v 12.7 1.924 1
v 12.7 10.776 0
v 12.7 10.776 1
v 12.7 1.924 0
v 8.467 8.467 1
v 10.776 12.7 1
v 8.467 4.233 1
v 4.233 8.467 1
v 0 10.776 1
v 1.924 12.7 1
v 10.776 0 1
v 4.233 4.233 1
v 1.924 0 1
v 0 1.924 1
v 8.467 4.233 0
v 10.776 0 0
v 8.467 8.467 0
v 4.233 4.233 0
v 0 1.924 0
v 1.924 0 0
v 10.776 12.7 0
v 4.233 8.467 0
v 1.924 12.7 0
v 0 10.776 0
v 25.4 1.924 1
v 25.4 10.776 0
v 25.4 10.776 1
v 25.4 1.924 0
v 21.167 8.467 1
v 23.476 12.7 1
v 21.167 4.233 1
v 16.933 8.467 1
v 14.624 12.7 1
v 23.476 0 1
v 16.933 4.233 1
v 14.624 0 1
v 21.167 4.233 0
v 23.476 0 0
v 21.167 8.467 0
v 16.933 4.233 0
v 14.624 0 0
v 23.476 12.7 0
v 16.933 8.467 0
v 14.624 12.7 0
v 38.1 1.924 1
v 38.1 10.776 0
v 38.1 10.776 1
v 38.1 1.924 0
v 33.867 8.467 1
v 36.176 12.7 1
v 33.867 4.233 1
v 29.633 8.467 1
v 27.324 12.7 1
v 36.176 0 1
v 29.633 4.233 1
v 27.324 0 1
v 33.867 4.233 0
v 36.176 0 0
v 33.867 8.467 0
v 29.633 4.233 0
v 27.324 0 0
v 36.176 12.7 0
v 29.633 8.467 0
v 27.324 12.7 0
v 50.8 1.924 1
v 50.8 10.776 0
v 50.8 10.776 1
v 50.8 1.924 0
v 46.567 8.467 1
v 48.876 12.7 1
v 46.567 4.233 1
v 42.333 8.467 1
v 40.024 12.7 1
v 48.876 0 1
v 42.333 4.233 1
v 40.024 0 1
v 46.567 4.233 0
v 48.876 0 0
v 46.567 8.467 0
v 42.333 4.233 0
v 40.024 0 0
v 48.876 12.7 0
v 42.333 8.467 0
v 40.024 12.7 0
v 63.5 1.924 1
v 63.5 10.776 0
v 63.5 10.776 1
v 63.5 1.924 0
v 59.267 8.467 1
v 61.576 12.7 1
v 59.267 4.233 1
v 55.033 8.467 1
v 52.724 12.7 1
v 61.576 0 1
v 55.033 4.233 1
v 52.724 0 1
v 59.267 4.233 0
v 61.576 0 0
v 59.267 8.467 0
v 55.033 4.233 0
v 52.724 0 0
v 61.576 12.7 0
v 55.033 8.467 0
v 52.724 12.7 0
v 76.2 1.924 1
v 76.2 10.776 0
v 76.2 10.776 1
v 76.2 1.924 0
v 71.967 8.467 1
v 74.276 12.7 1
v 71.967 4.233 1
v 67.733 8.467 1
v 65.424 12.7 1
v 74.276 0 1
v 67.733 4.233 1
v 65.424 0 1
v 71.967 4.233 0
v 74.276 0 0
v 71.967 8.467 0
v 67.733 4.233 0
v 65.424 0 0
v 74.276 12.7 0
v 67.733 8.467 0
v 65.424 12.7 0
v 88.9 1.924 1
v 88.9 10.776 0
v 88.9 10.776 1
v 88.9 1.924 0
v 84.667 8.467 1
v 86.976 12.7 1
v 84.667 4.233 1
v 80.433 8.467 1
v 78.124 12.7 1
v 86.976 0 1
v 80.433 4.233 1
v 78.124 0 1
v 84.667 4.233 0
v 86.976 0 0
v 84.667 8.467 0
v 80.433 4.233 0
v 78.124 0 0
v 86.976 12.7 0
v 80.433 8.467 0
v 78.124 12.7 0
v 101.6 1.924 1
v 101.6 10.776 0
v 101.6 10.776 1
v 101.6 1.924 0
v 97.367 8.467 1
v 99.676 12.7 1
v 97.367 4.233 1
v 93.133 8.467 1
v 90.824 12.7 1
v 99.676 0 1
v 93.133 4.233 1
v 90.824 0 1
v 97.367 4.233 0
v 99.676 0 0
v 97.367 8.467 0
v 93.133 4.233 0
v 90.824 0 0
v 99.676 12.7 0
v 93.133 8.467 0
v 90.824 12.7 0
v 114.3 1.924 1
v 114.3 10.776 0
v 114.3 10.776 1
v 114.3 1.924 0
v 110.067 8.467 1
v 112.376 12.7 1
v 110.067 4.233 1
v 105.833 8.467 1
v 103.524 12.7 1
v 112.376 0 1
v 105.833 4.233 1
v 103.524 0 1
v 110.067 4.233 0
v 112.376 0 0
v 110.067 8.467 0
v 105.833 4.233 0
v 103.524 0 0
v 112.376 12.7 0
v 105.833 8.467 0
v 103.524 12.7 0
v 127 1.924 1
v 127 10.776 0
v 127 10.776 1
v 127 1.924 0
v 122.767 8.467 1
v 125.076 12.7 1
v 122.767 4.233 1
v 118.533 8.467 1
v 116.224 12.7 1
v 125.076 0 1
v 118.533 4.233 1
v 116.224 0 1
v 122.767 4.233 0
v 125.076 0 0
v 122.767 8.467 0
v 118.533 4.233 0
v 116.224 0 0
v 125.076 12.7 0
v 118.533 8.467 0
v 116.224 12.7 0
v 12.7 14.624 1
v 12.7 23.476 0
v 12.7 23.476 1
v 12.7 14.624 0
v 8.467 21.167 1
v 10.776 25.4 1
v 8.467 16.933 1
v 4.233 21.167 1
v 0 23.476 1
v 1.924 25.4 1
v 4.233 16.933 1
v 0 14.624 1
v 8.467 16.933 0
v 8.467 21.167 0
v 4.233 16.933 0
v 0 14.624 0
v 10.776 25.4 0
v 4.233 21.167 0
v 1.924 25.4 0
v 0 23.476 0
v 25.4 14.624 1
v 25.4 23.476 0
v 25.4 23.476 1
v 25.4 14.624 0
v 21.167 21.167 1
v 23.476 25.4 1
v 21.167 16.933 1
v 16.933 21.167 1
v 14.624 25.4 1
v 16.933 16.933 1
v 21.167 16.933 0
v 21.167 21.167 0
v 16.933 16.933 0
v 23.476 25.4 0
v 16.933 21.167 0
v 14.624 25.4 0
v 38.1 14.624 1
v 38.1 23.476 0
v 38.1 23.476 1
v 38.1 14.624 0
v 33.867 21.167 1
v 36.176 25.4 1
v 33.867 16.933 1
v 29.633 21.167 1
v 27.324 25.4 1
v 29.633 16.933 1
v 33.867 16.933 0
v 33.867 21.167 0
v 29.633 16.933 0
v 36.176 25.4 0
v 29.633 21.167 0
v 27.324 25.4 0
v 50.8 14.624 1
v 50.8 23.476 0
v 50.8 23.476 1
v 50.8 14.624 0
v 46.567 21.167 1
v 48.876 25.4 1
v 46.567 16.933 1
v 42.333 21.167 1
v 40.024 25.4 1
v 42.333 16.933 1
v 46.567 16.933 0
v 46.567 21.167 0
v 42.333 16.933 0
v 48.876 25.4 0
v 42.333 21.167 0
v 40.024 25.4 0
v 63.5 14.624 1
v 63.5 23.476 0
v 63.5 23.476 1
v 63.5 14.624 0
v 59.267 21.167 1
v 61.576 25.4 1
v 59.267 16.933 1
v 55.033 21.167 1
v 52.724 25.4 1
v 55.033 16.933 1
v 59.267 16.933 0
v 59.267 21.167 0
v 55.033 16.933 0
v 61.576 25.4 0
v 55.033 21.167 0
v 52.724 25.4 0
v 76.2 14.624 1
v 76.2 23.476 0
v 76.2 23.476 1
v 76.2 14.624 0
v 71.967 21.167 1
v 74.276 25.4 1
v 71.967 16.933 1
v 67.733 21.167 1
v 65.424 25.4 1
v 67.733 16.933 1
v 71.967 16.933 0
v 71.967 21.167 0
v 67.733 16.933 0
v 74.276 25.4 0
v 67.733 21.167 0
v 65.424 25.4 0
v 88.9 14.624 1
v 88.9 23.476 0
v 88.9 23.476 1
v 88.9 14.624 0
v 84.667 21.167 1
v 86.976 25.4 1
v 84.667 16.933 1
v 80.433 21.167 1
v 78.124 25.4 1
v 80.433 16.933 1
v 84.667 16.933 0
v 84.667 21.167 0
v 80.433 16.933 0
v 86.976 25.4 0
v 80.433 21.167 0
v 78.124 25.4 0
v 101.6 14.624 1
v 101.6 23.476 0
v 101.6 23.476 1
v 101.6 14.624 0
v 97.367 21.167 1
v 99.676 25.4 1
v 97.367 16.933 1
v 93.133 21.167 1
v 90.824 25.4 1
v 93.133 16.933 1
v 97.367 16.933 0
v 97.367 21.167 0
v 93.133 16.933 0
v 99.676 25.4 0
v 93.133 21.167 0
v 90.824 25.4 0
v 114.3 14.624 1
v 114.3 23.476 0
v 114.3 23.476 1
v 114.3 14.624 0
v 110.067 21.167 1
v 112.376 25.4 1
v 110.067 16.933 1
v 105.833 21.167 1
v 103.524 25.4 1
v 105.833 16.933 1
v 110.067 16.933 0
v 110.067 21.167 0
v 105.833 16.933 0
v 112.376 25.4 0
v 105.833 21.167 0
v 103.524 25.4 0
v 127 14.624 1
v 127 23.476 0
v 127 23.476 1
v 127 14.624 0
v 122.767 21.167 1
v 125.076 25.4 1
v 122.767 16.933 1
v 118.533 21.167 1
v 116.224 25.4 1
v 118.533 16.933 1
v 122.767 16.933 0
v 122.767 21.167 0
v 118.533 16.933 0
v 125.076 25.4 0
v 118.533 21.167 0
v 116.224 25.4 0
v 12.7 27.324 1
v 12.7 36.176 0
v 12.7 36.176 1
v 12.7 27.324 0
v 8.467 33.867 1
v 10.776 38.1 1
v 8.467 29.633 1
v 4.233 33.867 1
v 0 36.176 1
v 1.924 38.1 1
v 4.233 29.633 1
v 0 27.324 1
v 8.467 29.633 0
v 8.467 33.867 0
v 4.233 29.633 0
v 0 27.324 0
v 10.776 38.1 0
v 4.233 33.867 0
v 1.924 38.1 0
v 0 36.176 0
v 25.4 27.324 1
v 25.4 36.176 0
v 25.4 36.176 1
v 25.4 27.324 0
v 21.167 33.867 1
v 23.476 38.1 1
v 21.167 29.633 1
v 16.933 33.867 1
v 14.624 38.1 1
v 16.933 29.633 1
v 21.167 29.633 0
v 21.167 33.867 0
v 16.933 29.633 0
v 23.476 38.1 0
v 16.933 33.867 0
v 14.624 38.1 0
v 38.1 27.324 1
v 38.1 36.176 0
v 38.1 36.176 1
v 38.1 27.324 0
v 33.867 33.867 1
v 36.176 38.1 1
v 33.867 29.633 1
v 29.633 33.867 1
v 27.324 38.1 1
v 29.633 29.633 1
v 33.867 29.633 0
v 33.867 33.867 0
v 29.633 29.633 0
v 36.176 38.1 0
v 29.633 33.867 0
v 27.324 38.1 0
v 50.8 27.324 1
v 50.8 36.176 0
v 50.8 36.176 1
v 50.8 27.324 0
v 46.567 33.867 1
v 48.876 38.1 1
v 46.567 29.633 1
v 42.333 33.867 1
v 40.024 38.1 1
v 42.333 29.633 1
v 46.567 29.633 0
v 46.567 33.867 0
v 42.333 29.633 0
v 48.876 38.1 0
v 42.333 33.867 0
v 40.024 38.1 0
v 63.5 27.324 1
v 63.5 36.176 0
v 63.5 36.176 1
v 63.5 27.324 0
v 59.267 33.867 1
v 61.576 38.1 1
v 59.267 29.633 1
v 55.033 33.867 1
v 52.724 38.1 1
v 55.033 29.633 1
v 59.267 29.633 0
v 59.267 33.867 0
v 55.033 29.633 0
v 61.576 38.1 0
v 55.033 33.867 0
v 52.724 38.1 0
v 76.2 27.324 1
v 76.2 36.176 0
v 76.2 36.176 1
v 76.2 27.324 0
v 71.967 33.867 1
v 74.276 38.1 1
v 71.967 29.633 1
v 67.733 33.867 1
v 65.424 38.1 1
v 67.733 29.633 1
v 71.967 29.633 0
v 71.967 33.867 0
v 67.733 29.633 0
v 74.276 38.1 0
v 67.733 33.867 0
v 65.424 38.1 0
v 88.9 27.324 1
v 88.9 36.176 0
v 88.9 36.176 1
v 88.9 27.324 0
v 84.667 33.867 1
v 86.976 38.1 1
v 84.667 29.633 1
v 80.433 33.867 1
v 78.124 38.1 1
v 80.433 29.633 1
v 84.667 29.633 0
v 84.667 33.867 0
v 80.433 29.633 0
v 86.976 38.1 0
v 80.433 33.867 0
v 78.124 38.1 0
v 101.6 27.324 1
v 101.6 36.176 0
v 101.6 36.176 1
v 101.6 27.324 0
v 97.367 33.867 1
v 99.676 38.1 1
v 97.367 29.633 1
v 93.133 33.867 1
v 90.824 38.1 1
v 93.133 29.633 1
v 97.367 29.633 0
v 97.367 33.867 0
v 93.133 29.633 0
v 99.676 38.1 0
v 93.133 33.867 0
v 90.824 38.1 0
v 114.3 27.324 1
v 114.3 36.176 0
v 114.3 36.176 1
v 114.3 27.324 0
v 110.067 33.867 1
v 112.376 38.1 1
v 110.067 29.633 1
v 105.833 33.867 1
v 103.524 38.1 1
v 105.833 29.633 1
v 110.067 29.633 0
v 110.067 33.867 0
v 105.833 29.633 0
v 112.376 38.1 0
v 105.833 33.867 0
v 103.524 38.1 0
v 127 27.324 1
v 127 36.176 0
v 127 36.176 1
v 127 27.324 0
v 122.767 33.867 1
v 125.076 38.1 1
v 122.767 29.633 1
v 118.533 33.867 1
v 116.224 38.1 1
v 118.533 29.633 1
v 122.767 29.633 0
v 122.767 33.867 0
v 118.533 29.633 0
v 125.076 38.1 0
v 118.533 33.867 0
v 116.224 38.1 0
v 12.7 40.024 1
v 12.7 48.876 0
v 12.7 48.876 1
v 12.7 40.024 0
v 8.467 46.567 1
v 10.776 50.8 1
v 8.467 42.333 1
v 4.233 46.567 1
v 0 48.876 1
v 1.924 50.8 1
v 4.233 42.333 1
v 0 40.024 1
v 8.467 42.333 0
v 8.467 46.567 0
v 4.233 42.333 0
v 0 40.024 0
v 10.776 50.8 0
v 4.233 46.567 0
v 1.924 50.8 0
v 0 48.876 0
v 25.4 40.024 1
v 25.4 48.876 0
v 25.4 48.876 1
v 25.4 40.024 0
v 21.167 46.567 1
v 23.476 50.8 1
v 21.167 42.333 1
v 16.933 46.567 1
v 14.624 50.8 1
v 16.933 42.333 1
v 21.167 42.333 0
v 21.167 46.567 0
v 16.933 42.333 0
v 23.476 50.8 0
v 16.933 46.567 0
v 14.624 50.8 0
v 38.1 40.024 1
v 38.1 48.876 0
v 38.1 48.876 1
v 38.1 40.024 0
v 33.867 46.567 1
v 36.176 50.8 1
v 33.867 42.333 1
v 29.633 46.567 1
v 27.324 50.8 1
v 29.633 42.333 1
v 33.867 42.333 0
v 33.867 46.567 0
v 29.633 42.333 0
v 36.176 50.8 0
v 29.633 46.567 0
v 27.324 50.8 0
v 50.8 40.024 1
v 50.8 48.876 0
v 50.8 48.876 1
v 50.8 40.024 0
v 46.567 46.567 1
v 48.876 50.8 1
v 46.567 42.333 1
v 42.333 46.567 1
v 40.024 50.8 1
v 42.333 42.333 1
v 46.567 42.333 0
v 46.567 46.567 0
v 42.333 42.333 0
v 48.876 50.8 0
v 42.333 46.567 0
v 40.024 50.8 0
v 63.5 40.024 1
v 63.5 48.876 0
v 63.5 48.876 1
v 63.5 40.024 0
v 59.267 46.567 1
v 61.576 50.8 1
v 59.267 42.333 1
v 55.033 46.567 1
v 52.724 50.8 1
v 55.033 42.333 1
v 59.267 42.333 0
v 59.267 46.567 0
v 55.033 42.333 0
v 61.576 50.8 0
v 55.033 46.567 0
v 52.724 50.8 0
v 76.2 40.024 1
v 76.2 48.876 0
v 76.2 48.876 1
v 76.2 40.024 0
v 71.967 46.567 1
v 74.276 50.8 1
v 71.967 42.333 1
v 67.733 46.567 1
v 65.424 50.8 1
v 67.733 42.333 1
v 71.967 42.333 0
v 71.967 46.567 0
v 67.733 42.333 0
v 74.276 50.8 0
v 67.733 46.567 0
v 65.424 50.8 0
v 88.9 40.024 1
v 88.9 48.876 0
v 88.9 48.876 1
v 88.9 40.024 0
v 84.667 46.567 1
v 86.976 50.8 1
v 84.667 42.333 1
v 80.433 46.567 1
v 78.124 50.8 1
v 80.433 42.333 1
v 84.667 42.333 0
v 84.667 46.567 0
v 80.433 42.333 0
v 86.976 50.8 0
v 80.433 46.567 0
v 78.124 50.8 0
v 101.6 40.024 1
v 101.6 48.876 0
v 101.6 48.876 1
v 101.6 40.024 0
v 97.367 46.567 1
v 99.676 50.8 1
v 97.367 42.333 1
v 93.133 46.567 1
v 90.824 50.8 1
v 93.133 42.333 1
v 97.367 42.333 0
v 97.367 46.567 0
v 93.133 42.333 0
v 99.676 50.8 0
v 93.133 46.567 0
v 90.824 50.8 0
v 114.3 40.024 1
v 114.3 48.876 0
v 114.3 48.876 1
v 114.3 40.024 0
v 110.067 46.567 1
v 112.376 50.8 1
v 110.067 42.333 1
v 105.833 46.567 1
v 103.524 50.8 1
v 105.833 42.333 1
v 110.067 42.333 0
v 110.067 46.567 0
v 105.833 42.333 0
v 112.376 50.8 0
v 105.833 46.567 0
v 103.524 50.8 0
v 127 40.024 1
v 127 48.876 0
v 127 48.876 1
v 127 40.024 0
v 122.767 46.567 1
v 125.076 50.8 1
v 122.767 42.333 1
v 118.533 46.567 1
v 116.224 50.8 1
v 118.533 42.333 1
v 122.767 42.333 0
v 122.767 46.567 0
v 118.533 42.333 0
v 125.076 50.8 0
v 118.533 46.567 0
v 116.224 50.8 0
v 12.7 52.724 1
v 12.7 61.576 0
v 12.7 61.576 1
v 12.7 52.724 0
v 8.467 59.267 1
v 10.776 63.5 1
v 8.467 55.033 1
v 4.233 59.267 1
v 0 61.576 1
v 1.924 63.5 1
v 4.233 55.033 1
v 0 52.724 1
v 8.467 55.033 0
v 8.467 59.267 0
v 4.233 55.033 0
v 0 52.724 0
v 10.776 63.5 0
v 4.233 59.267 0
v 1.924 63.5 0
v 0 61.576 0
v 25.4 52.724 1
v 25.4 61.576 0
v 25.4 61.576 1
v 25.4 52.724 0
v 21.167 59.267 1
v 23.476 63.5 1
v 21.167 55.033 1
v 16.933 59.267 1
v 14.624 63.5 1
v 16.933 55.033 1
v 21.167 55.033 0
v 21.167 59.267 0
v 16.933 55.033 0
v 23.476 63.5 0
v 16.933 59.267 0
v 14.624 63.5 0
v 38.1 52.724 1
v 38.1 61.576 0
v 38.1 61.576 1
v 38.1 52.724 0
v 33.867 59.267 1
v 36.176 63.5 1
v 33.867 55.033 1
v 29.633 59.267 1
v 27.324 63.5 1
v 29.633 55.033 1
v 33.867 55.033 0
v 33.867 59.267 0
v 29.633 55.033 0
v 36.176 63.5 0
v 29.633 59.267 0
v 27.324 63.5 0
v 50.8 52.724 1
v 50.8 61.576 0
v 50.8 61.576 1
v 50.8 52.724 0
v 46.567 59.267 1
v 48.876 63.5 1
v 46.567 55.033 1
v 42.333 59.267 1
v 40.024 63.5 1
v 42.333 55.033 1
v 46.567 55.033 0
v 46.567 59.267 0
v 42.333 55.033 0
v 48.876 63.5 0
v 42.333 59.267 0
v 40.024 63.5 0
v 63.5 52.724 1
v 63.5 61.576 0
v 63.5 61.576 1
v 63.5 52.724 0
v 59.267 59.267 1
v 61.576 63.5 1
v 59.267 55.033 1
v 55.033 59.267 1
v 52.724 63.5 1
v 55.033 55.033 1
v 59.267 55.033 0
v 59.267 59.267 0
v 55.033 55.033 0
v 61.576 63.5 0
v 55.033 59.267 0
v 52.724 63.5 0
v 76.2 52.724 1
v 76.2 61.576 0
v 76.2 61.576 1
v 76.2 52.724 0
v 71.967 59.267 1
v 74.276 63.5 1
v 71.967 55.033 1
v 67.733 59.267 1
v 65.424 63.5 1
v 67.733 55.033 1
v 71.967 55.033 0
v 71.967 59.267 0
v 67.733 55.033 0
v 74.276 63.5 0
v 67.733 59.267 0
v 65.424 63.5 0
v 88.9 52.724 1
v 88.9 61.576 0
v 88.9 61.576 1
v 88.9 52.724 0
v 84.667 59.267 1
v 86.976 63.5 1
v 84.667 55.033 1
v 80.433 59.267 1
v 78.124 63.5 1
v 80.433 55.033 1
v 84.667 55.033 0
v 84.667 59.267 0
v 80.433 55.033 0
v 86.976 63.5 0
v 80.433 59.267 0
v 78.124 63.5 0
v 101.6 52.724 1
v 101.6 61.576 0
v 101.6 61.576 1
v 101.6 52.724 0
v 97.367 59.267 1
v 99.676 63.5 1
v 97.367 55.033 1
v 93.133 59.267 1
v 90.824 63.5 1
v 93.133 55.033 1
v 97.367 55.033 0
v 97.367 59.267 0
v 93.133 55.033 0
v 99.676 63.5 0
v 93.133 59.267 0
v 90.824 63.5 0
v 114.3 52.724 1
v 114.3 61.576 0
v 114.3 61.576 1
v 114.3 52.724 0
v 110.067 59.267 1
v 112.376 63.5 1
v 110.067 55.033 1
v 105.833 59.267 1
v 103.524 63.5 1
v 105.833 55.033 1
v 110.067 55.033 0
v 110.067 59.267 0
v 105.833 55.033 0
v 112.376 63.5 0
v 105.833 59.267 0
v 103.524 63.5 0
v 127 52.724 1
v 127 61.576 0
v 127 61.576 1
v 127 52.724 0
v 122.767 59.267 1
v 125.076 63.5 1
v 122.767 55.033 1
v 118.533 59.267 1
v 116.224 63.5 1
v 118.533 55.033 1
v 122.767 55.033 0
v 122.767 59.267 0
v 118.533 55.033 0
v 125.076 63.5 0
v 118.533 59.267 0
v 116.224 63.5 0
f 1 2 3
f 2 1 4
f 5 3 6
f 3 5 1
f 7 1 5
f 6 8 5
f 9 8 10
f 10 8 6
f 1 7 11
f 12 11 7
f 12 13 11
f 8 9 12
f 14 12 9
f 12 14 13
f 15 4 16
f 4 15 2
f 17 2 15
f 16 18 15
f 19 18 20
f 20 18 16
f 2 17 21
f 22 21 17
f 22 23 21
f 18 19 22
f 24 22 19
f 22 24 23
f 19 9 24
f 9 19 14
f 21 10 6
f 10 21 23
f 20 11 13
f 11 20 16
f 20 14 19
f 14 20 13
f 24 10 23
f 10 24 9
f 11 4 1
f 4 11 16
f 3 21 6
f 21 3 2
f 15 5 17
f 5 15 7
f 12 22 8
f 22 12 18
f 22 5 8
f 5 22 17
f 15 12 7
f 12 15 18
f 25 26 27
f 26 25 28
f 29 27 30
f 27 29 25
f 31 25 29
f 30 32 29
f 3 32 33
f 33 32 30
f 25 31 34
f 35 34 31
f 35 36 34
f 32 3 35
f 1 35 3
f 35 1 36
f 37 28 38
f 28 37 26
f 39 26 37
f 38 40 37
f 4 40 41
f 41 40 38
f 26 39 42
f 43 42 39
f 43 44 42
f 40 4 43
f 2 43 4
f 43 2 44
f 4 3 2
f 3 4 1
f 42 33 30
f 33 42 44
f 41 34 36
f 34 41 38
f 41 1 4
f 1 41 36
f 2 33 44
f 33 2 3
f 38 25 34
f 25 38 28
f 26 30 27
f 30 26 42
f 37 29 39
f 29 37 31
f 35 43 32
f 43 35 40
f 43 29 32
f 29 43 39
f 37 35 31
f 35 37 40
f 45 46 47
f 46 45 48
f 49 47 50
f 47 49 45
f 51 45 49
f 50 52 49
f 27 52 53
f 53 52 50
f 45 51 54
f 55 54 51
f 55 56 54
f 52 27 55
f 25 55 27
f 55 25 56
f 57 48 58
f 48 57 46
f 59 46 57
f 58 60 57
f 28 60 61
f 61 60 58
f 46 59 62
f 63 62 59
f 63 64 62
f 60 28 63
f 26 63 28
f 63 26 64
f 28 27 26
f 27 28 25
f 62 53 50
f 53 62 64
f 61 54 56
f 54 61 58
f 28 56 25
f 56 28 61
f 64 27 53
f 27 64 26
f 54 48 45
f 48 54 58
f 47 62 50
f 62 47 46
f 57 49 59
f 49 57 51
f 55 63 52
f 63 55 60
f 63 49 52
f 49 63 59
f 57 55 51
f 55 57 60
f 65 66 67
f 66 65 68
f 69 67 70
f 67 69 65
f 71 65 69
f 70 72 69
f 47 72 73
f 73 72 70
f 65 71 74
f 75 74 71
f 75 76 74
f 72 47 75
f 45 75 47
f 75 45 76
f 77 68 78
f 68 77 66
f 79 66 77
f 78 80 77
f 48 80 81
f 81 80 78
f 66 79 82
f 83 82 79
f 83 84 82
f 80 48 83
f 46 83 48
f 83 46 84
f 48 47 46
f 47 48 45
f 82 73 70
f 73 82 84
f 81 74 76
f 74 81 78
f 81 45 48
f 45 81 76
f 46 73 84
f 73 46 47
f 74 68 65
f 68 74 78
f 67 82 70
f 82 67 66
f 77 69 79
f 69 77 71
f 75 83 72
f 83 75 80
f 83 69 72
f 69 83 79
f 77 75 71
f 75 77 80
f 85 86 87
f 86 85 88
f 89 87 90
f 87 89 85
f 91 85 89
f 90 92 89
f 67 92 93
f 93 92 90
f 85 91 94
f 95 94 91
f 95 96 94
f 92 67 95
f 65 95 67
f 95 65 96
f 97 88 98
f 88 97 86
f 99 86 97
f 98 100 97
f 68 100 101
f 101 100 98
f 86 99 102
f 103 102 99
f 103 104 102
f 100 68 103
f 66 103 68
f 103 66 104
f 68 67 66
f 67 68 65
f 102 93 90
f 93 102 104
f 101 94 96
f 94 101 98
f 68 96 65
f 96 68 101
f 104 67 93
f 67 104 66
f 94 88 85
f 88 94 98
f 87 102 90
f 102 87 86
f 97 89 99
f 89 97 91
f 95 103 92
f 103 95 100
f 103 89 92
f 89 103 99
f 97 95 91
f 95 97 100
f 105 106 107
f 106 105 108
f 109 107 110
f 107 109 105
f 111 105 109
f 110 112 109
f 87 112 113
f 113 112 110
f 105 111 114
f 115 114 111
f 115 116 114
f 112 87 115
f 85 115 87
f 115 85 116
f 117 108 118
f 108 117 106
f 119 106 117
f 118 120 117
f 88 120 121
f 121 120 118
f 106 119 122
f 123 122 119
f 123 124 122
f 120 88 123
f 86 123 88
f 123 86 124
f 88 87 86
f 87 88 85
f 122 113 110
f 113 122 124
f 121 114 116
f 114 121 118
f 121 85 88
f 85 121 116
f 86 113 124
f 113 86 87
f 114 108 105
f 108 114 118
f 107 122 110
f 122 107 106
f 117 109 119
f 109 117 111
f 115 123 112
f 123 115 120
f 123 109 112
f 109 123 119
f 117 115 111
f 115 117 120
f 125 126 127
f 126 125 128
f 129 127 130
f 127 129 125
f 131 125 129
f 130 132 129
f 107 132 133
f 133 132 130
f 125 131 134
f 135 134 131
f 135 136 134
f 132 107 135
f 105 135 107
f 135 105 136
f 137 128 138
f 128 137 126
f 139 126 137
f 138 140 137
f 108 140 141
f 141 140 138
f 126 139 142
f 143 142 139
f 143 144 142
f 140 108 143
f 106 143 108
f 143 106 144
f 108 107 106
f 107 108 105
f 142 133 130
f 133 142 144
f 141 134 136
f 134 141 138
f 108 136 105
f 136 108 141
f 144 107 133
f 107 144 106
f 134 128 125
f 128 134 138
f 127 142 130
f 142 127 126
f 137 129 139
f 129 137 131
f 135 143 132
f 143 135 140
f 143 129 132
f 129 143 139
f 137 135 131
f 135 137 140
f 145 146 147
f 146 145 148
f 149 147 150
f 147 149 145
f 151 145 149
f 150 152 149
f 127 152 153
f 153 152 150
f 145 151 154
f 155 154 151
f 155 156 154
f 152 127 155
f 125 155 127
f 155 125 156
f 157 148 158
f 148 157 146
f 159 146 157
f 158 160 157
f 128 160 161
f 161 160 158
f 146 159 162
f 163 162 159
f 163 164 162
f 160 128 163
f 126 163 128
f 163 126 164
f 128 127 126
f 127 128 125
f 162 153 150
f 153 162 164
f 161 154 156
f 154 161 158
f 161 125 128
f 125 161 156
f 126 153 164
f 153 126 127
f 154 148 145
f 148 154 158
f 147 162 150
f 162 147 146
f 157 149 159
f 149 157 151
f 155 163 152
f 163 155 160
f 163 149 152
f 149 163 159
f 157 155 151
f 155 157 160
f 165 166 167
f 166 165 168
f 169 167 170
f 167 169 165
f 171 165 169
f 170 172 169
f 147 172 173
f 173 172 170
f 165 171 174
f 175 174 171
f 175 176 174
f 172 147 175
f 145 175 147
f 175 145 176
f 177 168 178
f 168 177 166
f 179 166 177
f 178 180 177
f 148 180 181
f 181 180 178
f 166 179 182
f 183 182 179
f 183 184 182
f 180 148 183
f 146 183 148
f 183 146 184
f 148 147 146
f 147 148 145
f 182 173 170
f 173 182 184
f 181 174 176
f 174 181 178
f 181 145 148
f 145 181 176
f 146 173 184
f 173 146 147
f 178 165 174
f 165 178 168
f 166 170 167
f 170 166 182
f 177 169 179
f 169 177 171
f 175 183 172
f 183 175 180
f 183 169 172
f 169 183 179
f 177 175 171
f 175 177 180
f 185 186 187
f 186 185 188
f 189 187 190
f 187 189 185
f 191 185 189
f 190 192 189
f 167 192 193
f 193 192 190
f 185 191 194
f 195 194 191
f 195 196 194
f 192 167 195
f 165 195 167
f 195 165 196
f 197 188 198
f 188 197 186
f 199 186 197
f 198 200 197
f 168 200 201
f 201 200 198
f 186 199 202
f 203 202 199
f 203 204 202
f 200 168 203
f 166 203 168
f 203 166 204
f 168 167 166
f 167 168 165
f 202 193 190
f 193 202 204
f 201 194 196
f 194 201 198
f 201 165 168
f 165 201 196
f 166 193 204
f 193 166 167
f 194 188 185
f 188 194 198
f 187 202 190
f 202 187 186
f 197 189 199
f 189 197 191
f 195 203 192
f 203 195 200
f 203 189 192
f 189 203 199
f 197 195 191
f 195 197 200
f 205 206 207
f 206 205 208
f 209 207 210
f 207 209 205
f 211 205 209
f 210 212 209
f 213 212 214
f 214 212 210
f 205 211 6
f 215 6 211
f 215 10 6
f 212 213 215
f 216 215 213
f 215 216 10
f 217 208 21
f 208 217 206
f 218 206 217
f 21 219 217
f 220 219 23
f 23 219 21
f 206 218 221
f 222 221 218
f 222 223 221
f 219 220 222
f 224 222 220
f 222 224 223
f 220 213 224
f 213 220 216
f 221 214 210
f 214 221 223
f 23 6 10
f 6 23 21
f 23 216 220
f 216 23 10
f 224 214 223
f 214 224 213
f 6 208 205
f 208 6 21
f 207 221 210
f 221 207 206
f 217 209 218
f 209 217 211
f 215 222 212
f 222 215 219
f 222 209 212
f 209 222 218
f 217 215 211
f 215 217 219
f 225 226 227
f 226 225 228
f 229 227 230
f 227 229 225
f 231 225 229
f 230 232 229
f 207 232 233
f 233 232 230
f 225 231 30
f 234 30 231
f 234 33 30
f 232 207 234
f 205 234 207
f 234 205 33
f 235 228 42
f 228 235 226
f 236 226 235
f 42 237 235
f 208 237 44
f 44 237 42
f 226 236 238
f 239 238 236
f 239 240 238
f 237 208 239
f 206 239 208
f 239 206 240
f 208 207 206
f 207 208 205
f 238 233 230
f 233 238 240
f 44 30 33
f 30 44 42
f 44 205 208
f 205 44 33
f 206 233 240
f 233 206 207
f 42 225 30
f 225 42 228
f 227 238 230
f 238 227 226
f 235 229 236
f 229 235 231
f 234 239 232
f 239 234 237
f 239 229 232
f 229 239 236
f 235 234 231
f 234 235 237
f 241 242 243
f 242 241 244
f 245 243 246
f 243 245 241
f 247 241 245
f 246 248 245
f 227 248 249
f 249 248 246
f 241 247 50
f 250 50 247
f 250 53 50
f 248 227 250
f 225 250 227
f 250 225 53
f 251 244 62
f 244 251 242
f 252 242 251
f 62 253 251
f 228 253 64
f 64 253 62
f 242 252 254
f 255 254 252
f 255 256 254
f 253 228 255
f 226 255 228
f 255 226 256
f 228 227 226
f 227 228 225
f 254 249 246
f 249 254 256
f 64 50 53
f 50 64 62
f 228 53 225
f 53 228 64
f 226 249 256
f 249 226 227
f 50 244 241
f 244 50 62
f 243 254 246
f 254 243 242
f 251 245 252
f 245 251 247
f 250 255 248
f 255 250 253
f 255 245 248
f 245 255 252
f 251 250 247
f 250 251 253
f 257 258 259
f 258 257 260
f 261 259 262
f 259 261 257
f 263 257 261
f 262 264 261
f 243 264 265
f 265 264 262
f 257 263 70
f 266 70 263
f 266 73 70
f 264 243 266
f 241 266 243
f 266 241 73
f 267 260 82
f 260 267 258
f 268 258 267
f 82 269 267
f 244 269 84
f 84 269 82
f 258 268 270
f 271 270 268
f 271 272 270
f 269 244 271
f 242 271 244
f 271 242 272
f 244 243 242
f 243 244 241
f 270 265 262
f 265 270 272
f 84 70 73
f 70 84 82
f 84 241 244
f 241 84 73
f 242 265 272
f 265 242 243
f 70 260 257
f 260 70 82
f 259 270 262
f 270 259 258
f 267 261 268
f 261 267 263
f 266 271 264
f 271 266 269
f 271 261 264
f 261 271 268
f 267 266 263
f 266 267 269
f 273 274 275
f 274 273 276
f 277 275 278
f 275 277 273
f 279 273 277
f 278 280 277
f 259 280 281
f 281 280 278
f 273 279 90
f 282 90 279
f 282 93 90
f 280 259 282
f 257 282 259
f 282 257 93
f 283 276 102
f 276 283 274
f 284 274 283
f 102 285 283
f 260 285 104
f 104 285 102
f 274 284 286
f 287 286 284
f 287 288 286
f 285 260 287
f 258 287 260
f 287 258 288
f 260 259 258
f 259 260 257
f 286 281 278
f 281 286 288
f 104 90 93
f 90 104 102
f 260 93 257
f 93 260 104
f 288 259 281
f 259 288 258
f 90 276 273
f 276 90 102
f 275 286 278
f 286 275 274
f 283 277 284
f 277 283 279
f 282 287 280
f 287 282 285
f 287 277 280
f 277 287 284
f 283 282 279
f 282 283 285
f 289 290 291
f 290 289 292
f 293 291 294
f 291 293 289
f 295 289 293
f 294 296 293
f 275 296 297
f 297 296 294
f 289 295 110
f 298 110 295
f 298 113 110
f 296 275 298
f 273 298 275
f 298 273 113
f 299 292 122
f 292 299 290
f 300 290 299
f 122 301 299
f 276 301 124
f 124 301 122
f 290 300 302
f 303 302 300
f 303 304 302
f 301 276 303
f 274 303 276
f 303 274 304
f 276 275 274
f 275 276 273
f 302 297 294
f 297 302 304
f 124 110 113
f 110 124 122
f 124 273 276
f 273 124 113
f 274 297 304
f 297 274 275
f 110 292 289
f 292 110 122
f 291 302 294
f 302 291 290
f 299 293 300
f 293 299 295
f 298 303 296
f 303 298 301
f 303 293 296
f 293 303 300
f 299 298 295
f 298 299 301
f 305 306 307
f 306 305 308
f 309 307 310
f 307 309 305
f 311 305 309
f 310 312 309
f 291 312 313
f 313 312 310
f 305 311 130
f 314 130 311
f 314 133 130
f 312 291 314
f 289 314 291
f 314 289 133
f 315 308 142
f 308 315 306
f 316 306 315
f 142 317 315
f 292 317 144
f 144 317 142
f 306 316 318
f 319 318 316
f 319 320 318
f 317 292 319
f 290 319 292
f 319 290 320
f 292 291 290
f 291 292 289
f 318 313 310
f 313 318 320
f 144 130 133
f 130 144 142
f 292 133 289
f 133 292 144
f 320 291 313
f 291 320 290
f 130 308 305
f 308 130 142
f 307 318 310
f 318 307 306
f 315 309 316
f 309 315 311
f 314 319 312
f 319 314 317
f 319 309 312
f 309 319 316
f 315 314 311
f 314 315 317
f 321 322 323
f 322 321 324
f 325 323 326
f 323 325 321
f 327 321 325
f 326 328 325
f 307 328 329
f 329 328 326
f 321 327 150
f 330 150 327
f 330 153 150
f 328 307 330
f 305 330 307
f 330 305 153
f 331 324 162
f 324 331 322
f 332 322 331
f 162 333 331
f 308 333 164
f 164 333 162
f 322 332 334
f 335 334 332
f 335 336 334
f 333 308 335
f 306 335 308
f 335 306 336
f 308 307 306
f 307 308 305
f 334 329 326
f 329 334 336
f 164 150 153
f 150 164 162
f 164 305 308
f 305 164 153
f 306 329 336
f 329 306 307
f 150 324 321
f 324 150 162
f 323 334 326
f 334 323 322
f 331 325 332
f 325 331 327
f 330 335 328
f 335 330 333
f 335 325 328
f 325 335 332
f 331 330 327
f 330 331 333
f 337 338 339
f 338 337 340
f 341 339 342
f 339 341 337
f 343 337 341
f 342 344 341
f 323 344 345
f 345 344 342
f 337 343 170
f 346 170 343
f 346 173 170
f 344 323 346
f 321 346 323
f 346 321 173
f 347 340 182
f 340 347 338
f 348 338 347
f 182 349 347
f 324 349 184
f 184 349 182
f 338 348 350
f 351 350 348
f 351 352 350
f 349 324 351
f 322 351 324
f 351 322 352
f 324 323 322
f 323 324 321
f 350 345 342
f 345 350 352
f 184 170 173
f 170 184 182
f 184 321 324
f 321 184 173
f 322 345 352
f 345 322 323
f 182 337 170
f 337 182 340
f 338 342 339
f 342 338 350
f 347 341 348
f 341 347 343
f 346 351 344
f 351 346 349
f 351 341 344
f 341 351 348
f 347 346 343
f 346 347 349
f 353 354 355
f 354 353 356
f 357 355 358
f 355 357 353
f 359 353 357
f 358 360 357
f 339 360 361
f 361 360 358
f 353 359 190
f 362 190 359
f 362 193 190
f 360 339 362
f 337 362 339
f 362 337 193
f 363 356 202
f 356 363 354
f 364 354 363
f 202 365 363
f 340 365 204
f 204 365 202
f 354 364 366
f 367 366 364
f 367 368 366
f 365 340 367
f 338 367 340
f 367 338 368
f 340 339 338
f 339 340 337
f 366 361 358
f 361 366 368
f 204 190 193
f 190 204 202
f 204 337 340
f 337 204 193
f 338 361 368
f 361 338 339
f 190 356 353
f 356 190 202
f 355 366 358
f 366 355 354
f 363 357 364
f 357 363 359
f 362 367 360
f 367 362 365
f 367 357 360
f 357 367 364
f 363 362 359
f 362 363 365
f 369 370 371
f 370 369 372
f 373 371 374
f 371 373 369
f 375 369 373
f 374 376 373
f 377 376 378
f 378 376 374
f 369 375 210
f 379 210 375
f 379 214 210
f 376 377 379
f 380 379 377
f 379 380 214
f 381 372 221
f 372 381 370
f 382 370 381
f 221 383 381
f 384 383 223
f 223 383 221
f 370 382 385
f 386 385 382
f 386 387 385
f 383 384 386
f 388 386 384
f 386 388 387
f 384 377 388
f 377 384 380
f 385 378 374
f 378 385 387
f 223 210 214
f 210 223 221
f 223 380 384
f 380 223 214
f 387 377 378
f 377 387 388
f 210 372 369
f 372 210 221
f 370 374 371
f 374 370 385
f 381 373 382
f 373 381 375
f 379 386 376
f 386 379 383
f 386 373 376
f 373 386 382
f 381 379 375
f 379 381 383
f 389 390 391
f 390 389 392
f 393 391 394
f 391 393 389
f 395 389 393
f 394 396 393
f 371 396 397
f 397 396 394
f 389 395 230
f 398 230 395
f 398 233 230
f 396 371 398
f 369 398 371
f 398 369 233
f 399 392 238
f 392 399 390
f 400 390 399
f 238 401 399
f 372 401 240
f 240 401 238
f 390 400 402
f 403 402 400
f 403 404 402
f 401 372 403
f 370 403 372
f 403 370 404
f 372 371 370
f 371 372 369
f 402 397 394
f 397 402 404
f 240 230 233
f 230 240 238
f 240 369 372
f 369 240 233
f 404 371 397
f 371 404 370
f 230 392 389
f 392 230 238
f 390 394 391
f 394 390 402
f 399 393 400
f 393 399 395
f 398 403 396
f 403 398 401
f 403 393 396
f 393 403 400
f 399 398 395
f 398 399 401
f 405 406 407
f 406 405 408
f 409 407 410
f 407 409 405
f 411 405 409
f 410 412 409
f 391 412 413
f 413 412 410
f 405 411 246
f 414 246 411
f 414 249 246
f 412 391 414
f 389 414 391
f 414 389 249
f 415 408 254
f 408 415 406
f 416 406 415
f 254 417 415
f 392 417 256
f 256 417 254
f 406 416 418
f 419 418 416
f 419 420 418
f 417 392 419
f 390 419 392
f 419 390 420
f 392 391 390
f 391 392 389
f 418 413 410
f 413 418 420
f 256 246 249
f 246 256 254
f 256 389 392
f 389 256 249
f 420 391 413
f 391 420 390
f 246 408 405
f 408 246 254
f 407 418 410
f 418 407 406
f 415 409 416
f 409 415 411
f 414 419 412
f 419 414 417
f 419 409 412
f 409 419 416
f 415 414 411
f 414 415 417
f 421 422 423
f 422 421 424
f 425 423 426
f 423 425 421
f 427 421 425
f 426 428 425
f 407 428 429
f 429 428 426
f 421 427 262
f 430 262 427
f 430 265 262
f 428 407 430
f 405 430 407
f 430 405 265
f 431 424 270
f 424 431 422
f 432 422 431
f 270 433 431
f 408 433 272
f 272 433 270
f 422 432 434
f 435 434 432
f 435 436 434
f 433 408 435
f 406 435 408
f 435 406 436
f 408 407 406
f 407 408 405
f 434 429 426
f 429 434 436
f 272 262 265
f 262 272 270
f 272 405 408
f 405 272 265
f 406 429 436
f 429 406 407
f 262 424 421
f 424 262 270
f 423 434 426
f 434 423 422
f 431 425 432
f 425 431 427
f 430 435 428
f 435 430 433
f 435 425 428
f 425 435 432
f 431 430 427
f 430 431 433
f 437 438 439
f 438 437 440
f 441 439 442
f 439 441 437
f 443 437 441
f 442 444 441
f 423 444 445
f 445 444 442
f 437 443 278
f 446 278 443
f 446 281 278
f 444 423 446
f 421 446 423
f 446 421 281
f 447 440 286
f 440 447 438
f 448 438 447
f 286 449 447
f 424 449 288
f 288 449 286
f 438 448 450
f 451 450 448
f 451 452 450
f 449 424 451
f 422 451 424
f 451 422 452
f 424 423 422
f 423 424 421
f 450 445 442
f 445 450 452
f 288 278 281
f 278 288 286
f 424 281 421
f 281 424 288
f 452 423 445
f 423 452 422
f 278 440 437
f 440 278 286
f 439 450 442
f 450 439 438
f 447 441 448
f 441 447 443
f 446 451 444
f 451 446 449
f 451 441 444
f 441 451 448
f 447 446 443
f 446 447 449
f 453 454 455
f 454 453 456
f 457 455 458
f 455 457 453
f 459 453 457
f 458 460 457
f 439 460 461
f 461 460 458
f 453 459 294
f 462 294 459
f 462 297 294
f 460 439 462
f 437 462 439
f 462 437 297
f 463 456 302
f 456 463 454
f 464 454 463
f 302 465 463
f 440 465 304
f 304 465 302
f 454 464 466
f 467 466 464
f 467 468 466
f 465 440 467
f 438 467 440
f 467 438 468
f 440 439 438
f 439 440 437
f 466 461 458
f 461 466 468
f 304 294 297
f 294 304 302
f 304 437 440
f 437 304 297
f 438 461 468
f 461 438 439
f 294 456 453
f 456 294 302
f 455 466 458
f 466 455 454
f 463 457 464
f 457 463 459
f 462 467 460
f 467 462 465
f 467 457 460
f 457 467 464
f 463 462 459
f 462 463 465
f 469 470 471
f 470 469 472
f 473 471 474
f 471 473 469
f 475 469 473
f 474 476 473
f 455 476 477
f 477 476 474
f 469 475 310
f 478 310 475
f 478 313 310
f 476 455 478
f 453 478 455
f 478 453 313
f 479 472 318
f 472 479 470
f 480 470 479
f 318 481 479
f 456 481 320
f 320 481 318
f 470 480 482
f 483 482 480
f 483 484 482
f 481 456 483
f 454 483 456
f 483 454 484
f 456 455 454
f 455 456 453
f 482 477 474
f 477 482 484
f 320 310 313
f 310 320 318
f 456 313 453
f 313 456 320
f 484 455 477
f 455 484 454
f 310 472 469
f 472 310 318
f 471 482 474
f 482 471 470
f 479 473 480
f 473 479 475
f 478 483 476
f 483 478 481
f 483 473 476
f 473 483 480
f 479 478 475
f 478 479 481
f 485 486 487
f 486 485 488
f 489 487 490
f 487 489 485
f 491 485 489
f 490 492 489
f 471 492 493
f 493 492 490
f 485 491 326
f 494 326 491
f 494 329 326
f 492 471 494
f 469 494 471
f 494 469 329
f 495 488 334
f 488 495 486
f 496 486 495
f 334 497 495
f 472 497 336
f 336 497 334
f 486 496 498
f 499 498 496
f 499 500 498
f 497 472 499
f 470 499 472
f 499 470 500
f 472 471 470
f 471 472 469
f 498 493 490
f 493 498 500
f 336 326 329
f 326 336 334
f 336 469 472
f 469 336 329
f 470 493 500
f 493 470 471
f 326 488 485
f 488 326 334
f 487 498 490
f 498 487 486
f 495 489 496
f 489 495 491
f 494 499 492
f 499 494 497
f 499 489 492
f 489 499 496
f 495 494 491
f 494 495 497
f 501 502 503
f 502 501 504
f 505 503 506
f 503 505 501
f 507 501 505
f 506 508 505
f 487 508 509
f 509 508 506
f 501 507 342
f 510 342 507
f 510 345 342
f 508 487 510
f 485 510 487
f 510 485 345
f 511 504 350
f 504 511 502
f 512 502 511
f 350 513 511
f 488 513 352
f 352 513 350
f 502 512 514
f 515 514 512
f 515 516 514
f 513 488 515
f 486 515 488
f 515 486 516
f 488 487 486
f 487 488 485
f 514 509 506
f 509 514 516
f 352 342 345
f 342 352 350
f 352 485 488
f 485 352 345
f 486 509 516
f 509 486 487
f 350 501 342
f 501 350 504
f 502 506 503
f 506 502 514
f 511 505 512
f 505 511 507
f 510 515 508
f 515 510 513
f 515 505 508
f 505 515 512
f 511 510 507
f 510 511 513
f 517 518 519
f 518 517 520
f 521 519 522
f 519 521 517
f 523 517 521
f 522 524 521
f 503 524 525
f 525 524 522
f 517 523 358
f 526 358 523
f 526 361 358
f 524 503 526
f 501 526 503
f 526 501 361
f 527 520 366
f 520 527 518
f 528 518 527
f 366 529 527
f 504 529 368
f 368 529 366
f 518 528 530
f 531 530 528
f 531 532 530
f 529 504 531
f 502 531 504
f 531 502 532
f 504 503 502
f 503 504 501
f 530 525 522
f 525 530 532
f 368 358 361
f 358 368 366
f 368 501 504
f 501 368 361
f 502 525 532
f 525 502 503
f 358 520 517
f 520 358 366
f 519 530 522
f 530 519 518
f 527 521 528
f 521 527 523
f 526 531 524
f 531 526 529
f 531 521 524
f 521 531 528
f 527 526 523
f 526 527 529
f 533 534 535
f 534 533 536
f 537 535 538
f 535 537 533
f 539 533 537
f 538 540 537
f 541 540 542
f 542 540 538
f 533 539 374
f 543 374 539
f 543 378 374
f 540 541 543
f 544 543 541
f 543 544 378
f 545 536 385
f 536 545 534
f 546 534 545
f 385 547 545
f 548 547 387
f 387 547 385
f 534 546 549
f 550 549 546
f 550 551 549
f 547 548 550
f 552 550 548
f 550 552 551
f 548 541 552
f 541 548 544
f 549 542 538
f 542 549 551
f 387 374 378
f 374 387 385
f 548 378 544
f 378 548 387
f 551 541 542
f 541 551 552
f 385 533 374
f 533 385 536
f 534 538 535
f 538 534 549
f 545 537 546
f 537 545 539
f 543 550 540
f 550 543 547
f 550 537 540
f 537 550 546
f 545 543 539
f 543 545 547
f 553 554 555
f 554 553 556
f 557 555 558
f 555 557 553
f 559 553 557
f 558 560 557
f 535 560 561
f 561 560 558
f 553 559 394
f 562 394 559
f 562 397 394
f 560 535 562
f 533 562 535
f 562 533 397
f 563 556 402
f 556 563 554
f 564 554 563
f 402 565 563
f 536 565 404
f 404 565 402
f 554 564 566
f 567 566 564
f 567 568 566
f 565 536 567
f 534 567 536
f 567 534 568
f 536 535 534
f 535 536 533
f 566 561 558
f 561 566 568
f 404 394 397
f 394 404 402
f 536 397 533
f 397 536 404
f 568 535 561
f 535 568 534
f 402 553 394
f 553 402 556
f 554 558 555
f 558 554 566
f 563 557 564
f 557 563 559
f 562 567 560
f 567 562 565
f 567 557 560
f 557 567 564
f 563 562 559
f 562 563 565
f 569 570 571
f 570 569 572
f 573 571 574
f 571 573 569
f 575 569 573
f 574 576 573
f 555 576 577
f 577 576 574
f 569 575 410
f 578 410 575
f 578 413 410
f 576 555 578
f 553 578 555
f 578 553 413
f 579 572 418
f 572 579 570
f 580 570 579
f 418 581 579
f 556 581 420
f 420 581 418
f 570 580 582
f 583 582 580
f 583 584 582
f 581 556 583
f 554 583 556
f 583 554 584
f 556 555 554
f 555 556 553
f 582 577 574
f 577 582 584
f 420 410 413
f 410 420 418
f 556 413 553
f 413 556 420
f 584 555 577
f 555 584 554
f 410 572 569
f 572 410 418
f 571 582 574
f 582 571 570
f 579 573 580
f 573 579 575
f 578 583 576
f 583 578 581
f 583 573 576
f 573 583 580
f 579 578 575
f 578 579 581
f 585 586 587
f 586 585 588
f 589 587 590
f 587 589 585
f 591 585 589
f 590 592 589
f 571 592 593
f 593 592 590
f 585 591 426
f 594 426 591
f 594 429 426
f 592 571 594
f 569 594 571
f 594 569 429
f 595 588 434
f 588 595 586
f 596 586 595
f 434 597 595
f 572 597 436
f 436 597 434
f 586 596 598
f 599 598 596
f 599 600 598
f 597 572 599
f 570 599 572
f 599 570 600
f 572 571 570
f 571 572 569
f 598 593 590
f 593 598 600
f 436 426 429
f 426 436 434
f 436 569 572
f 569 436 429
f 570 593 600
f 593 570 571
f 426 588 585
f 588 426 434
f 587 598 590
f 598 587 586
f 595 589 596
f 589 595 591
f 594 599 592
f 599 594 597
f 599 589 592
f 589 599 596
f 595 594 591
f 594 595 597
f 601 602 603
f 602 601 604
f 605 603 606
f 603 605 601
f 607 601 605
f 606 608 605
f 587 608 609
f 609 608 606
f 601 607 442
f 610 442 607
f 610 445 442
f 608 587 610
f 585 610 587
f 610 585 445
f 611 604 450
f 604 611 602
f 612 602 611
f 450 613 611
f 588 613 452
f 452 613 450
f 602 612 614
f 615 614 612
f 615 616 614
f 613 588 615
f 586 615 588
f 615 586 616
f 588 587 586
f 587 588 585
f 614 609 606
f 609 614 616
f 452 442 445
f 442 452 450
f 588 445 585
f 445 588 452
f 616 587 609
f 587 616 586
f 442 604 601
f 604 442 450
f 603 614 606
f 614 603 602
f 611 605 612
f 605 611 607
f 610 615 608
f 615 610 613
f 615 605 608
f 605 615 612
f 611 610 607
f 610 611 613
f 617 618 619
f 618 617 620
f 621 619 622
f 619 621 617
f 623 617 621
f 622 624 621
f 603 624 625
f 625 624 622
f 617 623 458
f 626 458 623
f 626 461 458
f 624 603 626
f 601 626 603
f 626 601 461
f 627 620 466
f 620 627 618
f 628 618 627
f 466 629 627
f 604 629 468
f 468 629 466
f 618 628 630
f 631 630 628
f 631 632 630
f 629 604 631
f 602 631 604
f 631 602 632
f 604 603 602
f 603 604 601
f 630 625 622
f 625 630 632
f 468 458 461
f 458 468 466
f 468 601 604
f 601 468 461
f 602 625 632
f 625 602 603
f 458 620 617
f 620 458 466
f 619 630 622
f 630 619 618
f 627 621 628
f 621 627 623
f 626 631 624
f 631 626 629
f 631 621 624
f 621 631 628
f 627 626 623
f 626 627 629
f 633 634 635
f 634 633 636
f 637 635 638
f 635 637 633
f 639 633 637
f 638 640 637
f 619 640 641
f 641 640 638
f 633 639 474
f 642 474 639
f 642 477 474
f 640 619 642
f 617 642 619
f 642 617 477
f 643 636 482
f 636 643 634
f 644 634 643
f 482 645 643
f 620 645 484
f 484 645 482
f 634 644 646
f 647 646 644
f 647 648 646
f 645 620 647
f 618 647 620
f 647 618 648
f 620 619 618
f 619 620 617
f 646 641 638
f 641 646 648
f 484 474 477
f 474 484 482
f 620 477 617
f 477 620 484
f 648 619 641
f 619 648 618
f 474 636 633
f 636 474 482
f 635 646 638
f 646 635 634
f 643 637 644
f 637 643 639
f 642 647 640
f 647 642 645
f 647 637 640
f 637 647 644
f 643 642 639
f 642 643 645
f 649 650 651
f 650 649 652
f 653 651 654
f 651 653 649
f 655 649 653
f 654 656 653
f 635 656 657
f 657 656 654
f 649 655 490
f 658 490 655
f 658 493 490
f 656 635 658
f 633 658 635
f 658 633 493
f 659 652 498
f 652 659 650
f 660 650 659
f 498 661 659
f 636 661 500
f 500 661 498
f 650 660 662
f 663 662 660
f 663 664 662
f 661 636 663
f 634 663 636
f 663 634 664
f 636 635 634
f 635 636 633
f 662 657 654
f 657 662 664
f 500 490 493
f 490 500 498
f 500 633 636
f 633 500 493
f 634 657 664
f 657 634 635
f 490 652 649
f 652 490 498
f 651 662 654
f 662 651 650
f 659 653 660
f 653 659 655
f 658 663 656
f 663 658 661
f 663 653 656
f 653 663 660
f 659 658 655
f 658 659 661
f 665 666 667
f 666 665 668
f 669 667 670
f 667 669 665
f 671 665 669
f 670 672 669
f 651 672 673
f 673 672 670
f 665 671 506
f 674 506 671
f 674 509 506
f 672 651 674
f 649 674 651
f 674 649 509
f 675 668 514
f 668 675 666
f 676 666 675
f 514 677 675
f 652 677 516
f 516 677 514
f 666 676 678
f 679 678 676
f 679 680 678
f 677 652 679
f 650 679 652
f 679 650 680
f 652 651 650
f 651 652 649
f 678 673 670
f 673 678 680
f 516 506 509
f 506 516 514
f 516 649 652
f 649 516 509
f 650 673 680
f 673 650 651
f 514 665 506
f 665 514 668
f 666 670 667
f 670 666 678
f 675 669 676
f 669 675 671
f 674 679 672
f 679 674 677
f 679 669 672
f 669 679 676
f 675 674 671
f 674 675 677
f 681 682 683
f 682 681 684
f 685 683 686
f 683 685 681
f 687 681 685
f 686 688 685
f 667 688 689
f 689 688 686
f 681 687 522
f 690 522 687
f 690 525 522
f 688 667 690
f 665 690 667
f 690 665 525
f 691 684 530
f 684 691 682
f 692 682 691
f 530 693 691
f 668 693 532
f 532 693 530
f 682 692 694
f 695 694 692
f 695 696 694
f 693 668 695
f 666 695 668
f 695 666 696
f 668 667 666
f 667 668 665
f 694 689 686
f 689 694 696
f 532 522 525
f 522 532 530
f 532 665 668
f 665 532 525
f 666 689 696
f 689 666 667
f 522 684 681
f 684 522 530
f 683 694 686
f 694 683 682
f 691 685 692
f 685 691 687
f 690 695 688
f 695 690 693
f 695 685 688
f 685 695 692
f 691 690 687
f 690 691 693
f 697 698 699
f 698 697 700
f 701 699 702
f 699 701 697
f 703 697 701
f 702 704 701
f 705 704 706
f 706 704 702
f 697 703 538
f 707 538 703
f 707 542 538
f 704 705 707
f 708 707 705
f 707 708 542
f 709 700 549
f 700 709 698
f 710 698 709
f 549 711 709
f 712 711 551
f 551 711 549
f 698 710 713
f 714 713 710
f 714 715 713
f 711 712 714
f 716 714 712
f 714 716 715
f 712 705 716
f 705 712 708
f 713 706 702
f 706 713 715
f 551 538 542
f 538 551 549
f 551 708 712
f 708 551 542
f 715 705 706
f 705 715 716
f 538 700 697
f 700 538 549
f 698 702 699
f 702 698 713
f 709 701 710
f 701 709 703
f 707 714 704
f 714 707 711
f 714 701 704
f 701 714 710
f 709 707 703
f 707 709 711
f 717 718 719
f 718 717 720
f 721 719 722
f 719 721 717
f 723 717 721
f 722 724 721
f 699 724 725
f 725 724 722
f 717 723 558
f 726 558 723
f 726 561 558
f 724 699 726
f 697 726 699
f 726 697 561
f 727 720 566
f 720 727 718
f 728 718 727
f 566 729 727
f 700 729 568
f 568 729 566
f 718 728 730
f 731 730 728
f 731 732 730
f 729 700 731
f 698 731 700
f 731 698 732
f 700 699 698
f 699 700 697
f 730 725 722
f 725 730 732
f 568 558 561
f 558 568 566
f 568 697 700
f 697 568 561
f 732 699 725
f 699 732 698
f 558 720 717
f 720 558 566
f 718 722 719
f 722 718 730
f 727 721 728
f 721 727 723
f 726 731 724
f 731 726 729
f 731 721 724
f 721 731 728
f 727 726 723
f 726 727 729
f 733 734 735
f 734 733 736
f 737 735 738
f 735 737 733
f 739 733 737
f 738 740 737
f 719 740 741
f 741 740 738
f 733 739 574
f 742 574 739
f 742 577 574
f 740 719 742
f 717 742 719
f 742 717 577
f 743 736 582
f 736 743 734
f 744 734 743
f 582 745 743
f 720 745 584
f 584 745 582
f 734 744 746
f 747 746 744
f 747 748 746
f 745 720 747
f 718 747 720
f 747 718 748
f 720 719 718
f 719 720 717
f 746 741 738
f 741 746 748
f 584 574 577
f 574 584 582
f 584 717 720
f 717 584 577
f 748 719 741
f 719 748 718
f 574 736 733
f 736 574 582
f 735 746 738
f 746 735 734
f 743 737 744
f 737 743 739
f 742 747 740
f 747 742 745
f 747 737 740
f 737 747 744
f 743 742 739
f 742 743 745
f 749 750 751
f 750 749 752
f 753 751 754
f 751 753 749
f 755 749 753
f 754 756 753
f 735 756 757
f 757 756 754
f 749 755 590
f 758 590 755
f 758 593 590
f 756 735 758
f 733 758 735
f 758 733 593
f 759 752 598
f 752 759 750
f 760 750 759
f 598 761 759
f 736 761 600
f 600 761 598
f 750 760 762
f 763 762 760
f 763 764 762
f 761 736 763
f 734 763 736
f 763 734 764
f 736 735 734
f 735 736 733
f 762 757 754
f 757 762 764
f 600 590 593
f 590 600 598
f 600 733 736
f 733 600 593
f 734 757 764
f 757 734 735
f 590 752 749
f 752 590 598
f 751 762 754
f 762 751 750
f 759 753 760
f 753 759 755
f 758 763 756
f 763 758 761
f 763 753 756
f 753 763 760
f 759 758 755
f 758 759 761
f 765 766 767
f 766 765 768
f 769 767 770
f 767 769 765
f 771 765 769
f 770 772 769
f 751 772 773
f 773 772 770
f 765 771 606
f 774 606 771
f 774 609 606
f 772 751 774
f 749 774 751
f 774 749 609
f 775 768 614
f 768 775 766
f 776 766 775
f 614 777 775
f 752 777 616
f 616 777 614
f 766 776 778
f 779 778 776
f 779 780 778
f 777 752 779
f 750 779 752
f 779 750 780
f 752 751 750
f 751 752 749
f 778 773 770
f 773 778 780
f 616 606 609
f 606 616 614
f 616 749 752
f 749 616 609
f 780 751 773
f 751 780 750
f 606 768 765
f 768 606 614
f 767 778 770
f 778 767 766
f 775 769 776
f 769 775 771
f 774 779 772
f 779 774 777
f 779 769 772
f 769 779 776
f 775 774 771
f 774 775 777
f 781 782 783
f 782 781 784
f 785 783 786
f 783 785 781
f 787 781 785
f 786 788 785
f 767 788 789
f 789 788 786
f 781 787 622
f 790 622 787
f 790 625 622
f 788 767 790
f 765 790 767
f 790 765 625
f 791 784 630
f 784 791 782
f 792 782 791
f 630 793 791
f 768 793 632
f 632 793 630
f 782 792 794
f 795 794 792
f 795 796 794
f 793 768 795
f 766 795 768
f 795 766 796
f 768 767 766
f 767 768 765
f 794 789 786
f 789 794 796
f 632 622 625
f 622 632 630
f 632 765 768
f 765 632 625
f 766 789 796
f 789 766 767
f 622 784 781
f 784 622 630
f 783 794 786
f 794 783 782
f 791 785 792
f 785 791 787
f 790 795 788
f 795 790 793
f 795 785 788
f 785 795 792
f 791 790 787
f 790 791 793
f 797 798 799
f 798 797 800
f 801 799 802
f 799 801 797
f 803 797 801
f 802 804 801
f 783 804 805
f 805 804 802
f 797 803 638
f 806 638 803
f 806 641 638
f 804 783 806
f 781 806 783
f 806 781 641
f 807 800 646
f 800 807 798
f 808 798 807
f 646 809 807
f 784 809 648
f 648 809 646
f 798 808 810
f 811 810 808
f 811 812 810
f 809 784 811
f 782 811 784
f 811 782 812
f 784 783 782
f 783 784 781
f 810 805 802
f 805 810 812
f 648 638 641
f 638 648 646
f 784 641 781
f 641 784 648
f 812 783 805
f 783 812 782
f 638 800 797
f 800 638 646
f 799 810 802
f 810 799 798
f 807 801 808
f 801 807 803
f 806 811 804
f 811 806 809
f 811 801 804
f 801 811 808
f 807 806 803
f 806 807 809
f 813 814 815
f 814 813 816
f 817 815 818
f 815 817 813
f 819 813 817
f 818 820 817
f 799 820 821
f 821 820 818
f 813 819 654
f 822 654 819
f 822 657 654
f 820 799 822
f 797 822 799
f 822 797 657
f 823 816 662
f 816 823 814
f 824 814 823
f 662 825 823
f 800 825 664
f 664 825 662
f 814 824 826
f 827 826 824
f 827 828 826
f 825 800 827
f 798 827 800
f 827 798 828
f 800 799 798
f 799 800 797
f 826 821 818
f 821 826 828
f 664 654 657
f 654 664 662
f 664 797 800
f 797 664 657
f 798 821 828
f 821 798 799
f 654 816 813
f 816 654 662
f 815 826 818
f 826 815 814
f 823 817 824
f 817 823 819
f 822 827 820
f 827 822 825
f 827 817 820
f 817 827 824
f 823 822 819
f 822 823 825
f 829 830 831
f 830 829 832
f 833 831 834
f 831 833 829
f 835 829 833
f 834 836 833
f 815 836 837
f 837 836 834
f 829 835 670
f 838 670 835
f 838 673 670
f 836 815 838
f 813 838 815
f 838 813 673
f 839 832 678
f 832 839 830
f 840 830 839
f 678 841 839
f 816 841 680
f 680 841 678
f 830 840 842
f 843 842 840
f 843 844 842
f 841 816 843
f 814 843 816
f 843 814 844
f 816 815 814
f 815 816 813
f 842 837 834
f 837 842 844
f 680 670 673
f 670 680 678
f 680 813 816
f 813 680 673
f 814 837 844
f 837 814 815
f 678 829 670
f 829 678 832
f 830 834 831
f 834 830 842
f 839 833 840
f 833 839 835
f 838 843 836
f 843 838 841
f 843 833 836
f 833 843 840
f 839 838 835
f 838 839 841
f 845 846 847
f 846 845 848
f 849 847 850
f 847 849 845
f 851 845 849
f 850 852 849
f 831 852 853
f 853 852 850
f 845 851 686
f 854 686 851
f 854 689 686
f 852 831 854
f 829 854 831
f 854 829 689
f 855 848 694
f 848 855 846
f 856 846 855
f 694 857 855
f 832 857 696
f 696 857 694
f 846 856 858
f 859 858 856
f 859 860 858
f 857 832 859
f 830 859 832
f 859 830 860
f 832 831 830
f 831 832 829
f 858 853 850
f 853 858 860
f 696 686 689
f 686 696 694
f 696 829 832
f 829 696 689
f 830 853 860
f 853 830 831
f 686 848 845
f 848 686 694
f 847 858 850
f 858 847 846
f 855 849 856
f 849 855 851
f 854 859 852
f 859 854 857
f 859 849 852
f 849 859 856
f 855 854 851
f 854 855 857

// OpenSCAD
width=5;            //width in number of squares
length=10;           //length in number of squares
thickness=1;  //0.046 is the original if printed in plastic this should be thicker.


unit_width=0.5*2.54*10;  //the width of each unit, the vex unit is 0.5in
union(){
    for(j=[0:width-1]){
        union(){translate([0,unit_width*j,0]){
            for(i=[0:length-1]){
                translate([unit_width*i,0,0]) vex_unit();
                }
            }
        }
    }
}

module vex_unit(){
translate([unit_width/2,unit_width/2,thickness/2])difference(){
intersection(){
cube(size=[unit_width,unit_width,thickness],center=true);
rotate(45)cube(size=unit_width*6/5,center=true);
}
cube(size=[unit_width/3,unit_width/3,1.1*thickness],center=true);
}
}
